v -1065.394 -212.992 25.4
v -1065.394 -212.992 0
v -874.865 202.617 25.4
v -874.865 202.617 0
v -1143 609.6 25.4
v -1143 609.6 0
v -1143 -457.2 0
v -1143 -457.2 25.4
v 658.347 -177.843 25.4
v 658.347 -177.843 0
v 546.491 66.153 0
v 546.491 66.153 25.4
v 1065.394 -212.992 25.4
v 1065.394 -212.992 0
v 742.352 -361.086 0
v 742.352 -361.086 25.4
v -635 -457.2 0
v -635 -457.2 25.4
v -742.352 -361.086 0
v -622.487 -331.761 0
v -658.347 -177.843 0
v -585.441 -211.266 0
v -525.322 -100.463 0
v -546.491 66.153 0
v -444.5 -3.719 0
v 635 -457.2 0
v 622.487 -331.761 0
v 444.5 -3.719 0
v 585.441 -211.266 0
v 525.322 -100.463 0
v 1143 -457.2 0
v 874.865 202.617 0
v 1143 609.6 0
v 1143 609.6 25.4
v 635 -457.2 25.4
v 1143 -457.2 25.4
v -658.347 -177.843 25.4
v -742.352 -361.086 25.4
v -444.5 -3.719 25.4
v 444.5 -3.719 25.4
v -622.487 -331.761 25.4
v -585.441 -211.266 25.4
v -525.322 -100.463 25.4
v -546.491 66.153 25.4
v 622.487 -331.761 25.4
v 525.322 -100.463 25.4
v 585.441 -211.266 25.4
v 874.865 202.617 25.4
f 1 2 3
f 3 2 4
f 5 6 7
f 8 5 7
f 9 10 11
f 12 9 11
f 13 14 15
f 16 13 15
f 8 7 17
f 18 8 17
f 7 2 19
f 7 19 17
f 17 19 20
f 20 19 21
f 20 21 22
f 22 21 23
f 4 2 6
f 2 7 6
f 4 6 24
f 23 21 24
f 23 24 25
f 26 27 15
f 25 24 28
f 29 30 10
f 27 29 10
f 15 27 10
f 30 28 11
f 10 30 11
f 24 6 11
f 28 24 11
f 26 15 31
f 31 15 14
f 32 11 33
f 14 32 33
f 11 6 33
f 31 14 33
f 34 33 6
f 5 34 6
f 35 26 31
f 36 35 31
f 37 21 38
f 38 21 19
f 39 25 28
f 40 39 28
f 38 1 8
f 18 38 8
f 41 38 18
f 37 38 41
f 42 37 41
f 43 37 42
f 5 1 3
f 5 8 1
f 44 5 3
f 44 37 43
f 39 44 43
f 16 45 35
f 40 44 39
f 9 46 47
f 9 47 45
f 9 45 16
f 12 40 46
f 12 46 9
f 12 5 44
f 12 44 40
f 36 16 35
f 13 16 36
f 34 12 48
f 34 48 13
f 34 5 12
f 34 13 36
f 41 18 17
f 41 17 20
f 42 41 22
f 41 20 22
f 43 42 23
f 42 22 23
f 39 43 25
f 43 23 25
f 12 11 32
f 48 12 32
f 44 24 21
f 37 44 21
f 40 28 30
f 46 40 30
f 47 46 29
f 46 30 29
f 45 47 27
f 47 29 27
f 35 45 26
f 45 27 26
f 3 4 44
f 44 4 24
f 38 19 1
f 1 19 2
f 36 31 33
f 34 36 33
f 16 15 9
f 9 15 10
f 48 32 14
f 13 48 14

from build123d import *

# Parameters (mm, degrees)
F1_DEPTH = 25.4


with BuildPart() as f1:
    # F0 (on Top) → F1 (new body)
    with BuildSketch(Plane.XY):
        with BuildLine():
            Line((0, 609.6), (-1143, 609.6))
            Line((-1143, 609.6), (-1143, 0))
            Line((-1143, 0), (-1143, -457.2))
            Line((-1143, -457.2), (-635, -457.2))
            ThreePointArc((-635, -457.2), (-585.441073, -211.265558), (-444.5, -3.719295))
            Line((-444.5, -3.719295), (444.5, -3.719295))
            ThreePointArc((444.5, -3.719295), (585.441073, -211.265558), (635, -457.2))
            Line((635, -457.2), (1143, -457.2))
            Line((1143, -457.2), (1143, 0))
            Line((1143, 0), (1143, 609.6))
            Line((1143, 609.6), (0, 609.6))
        make_face()
        Polygon((-874.864551, 202.616595), (-546.491051, 66.153398), (-658.347487, -177.842677), (-742.352484, -361.085502), (-1065.394138, -212.991774), align=None, mode=Mode.SUBTRACT)
        Polygon((742.352484, -361.085502), (658.347487, -177.842677), (546.491051, 66.153398), (874.864551, 202.616595), (1065.394138, -212.991774), align=None, mode=Mode.SUBTRACT)
    extrude(amount=F1_DEPTH)


solid = f1.part
